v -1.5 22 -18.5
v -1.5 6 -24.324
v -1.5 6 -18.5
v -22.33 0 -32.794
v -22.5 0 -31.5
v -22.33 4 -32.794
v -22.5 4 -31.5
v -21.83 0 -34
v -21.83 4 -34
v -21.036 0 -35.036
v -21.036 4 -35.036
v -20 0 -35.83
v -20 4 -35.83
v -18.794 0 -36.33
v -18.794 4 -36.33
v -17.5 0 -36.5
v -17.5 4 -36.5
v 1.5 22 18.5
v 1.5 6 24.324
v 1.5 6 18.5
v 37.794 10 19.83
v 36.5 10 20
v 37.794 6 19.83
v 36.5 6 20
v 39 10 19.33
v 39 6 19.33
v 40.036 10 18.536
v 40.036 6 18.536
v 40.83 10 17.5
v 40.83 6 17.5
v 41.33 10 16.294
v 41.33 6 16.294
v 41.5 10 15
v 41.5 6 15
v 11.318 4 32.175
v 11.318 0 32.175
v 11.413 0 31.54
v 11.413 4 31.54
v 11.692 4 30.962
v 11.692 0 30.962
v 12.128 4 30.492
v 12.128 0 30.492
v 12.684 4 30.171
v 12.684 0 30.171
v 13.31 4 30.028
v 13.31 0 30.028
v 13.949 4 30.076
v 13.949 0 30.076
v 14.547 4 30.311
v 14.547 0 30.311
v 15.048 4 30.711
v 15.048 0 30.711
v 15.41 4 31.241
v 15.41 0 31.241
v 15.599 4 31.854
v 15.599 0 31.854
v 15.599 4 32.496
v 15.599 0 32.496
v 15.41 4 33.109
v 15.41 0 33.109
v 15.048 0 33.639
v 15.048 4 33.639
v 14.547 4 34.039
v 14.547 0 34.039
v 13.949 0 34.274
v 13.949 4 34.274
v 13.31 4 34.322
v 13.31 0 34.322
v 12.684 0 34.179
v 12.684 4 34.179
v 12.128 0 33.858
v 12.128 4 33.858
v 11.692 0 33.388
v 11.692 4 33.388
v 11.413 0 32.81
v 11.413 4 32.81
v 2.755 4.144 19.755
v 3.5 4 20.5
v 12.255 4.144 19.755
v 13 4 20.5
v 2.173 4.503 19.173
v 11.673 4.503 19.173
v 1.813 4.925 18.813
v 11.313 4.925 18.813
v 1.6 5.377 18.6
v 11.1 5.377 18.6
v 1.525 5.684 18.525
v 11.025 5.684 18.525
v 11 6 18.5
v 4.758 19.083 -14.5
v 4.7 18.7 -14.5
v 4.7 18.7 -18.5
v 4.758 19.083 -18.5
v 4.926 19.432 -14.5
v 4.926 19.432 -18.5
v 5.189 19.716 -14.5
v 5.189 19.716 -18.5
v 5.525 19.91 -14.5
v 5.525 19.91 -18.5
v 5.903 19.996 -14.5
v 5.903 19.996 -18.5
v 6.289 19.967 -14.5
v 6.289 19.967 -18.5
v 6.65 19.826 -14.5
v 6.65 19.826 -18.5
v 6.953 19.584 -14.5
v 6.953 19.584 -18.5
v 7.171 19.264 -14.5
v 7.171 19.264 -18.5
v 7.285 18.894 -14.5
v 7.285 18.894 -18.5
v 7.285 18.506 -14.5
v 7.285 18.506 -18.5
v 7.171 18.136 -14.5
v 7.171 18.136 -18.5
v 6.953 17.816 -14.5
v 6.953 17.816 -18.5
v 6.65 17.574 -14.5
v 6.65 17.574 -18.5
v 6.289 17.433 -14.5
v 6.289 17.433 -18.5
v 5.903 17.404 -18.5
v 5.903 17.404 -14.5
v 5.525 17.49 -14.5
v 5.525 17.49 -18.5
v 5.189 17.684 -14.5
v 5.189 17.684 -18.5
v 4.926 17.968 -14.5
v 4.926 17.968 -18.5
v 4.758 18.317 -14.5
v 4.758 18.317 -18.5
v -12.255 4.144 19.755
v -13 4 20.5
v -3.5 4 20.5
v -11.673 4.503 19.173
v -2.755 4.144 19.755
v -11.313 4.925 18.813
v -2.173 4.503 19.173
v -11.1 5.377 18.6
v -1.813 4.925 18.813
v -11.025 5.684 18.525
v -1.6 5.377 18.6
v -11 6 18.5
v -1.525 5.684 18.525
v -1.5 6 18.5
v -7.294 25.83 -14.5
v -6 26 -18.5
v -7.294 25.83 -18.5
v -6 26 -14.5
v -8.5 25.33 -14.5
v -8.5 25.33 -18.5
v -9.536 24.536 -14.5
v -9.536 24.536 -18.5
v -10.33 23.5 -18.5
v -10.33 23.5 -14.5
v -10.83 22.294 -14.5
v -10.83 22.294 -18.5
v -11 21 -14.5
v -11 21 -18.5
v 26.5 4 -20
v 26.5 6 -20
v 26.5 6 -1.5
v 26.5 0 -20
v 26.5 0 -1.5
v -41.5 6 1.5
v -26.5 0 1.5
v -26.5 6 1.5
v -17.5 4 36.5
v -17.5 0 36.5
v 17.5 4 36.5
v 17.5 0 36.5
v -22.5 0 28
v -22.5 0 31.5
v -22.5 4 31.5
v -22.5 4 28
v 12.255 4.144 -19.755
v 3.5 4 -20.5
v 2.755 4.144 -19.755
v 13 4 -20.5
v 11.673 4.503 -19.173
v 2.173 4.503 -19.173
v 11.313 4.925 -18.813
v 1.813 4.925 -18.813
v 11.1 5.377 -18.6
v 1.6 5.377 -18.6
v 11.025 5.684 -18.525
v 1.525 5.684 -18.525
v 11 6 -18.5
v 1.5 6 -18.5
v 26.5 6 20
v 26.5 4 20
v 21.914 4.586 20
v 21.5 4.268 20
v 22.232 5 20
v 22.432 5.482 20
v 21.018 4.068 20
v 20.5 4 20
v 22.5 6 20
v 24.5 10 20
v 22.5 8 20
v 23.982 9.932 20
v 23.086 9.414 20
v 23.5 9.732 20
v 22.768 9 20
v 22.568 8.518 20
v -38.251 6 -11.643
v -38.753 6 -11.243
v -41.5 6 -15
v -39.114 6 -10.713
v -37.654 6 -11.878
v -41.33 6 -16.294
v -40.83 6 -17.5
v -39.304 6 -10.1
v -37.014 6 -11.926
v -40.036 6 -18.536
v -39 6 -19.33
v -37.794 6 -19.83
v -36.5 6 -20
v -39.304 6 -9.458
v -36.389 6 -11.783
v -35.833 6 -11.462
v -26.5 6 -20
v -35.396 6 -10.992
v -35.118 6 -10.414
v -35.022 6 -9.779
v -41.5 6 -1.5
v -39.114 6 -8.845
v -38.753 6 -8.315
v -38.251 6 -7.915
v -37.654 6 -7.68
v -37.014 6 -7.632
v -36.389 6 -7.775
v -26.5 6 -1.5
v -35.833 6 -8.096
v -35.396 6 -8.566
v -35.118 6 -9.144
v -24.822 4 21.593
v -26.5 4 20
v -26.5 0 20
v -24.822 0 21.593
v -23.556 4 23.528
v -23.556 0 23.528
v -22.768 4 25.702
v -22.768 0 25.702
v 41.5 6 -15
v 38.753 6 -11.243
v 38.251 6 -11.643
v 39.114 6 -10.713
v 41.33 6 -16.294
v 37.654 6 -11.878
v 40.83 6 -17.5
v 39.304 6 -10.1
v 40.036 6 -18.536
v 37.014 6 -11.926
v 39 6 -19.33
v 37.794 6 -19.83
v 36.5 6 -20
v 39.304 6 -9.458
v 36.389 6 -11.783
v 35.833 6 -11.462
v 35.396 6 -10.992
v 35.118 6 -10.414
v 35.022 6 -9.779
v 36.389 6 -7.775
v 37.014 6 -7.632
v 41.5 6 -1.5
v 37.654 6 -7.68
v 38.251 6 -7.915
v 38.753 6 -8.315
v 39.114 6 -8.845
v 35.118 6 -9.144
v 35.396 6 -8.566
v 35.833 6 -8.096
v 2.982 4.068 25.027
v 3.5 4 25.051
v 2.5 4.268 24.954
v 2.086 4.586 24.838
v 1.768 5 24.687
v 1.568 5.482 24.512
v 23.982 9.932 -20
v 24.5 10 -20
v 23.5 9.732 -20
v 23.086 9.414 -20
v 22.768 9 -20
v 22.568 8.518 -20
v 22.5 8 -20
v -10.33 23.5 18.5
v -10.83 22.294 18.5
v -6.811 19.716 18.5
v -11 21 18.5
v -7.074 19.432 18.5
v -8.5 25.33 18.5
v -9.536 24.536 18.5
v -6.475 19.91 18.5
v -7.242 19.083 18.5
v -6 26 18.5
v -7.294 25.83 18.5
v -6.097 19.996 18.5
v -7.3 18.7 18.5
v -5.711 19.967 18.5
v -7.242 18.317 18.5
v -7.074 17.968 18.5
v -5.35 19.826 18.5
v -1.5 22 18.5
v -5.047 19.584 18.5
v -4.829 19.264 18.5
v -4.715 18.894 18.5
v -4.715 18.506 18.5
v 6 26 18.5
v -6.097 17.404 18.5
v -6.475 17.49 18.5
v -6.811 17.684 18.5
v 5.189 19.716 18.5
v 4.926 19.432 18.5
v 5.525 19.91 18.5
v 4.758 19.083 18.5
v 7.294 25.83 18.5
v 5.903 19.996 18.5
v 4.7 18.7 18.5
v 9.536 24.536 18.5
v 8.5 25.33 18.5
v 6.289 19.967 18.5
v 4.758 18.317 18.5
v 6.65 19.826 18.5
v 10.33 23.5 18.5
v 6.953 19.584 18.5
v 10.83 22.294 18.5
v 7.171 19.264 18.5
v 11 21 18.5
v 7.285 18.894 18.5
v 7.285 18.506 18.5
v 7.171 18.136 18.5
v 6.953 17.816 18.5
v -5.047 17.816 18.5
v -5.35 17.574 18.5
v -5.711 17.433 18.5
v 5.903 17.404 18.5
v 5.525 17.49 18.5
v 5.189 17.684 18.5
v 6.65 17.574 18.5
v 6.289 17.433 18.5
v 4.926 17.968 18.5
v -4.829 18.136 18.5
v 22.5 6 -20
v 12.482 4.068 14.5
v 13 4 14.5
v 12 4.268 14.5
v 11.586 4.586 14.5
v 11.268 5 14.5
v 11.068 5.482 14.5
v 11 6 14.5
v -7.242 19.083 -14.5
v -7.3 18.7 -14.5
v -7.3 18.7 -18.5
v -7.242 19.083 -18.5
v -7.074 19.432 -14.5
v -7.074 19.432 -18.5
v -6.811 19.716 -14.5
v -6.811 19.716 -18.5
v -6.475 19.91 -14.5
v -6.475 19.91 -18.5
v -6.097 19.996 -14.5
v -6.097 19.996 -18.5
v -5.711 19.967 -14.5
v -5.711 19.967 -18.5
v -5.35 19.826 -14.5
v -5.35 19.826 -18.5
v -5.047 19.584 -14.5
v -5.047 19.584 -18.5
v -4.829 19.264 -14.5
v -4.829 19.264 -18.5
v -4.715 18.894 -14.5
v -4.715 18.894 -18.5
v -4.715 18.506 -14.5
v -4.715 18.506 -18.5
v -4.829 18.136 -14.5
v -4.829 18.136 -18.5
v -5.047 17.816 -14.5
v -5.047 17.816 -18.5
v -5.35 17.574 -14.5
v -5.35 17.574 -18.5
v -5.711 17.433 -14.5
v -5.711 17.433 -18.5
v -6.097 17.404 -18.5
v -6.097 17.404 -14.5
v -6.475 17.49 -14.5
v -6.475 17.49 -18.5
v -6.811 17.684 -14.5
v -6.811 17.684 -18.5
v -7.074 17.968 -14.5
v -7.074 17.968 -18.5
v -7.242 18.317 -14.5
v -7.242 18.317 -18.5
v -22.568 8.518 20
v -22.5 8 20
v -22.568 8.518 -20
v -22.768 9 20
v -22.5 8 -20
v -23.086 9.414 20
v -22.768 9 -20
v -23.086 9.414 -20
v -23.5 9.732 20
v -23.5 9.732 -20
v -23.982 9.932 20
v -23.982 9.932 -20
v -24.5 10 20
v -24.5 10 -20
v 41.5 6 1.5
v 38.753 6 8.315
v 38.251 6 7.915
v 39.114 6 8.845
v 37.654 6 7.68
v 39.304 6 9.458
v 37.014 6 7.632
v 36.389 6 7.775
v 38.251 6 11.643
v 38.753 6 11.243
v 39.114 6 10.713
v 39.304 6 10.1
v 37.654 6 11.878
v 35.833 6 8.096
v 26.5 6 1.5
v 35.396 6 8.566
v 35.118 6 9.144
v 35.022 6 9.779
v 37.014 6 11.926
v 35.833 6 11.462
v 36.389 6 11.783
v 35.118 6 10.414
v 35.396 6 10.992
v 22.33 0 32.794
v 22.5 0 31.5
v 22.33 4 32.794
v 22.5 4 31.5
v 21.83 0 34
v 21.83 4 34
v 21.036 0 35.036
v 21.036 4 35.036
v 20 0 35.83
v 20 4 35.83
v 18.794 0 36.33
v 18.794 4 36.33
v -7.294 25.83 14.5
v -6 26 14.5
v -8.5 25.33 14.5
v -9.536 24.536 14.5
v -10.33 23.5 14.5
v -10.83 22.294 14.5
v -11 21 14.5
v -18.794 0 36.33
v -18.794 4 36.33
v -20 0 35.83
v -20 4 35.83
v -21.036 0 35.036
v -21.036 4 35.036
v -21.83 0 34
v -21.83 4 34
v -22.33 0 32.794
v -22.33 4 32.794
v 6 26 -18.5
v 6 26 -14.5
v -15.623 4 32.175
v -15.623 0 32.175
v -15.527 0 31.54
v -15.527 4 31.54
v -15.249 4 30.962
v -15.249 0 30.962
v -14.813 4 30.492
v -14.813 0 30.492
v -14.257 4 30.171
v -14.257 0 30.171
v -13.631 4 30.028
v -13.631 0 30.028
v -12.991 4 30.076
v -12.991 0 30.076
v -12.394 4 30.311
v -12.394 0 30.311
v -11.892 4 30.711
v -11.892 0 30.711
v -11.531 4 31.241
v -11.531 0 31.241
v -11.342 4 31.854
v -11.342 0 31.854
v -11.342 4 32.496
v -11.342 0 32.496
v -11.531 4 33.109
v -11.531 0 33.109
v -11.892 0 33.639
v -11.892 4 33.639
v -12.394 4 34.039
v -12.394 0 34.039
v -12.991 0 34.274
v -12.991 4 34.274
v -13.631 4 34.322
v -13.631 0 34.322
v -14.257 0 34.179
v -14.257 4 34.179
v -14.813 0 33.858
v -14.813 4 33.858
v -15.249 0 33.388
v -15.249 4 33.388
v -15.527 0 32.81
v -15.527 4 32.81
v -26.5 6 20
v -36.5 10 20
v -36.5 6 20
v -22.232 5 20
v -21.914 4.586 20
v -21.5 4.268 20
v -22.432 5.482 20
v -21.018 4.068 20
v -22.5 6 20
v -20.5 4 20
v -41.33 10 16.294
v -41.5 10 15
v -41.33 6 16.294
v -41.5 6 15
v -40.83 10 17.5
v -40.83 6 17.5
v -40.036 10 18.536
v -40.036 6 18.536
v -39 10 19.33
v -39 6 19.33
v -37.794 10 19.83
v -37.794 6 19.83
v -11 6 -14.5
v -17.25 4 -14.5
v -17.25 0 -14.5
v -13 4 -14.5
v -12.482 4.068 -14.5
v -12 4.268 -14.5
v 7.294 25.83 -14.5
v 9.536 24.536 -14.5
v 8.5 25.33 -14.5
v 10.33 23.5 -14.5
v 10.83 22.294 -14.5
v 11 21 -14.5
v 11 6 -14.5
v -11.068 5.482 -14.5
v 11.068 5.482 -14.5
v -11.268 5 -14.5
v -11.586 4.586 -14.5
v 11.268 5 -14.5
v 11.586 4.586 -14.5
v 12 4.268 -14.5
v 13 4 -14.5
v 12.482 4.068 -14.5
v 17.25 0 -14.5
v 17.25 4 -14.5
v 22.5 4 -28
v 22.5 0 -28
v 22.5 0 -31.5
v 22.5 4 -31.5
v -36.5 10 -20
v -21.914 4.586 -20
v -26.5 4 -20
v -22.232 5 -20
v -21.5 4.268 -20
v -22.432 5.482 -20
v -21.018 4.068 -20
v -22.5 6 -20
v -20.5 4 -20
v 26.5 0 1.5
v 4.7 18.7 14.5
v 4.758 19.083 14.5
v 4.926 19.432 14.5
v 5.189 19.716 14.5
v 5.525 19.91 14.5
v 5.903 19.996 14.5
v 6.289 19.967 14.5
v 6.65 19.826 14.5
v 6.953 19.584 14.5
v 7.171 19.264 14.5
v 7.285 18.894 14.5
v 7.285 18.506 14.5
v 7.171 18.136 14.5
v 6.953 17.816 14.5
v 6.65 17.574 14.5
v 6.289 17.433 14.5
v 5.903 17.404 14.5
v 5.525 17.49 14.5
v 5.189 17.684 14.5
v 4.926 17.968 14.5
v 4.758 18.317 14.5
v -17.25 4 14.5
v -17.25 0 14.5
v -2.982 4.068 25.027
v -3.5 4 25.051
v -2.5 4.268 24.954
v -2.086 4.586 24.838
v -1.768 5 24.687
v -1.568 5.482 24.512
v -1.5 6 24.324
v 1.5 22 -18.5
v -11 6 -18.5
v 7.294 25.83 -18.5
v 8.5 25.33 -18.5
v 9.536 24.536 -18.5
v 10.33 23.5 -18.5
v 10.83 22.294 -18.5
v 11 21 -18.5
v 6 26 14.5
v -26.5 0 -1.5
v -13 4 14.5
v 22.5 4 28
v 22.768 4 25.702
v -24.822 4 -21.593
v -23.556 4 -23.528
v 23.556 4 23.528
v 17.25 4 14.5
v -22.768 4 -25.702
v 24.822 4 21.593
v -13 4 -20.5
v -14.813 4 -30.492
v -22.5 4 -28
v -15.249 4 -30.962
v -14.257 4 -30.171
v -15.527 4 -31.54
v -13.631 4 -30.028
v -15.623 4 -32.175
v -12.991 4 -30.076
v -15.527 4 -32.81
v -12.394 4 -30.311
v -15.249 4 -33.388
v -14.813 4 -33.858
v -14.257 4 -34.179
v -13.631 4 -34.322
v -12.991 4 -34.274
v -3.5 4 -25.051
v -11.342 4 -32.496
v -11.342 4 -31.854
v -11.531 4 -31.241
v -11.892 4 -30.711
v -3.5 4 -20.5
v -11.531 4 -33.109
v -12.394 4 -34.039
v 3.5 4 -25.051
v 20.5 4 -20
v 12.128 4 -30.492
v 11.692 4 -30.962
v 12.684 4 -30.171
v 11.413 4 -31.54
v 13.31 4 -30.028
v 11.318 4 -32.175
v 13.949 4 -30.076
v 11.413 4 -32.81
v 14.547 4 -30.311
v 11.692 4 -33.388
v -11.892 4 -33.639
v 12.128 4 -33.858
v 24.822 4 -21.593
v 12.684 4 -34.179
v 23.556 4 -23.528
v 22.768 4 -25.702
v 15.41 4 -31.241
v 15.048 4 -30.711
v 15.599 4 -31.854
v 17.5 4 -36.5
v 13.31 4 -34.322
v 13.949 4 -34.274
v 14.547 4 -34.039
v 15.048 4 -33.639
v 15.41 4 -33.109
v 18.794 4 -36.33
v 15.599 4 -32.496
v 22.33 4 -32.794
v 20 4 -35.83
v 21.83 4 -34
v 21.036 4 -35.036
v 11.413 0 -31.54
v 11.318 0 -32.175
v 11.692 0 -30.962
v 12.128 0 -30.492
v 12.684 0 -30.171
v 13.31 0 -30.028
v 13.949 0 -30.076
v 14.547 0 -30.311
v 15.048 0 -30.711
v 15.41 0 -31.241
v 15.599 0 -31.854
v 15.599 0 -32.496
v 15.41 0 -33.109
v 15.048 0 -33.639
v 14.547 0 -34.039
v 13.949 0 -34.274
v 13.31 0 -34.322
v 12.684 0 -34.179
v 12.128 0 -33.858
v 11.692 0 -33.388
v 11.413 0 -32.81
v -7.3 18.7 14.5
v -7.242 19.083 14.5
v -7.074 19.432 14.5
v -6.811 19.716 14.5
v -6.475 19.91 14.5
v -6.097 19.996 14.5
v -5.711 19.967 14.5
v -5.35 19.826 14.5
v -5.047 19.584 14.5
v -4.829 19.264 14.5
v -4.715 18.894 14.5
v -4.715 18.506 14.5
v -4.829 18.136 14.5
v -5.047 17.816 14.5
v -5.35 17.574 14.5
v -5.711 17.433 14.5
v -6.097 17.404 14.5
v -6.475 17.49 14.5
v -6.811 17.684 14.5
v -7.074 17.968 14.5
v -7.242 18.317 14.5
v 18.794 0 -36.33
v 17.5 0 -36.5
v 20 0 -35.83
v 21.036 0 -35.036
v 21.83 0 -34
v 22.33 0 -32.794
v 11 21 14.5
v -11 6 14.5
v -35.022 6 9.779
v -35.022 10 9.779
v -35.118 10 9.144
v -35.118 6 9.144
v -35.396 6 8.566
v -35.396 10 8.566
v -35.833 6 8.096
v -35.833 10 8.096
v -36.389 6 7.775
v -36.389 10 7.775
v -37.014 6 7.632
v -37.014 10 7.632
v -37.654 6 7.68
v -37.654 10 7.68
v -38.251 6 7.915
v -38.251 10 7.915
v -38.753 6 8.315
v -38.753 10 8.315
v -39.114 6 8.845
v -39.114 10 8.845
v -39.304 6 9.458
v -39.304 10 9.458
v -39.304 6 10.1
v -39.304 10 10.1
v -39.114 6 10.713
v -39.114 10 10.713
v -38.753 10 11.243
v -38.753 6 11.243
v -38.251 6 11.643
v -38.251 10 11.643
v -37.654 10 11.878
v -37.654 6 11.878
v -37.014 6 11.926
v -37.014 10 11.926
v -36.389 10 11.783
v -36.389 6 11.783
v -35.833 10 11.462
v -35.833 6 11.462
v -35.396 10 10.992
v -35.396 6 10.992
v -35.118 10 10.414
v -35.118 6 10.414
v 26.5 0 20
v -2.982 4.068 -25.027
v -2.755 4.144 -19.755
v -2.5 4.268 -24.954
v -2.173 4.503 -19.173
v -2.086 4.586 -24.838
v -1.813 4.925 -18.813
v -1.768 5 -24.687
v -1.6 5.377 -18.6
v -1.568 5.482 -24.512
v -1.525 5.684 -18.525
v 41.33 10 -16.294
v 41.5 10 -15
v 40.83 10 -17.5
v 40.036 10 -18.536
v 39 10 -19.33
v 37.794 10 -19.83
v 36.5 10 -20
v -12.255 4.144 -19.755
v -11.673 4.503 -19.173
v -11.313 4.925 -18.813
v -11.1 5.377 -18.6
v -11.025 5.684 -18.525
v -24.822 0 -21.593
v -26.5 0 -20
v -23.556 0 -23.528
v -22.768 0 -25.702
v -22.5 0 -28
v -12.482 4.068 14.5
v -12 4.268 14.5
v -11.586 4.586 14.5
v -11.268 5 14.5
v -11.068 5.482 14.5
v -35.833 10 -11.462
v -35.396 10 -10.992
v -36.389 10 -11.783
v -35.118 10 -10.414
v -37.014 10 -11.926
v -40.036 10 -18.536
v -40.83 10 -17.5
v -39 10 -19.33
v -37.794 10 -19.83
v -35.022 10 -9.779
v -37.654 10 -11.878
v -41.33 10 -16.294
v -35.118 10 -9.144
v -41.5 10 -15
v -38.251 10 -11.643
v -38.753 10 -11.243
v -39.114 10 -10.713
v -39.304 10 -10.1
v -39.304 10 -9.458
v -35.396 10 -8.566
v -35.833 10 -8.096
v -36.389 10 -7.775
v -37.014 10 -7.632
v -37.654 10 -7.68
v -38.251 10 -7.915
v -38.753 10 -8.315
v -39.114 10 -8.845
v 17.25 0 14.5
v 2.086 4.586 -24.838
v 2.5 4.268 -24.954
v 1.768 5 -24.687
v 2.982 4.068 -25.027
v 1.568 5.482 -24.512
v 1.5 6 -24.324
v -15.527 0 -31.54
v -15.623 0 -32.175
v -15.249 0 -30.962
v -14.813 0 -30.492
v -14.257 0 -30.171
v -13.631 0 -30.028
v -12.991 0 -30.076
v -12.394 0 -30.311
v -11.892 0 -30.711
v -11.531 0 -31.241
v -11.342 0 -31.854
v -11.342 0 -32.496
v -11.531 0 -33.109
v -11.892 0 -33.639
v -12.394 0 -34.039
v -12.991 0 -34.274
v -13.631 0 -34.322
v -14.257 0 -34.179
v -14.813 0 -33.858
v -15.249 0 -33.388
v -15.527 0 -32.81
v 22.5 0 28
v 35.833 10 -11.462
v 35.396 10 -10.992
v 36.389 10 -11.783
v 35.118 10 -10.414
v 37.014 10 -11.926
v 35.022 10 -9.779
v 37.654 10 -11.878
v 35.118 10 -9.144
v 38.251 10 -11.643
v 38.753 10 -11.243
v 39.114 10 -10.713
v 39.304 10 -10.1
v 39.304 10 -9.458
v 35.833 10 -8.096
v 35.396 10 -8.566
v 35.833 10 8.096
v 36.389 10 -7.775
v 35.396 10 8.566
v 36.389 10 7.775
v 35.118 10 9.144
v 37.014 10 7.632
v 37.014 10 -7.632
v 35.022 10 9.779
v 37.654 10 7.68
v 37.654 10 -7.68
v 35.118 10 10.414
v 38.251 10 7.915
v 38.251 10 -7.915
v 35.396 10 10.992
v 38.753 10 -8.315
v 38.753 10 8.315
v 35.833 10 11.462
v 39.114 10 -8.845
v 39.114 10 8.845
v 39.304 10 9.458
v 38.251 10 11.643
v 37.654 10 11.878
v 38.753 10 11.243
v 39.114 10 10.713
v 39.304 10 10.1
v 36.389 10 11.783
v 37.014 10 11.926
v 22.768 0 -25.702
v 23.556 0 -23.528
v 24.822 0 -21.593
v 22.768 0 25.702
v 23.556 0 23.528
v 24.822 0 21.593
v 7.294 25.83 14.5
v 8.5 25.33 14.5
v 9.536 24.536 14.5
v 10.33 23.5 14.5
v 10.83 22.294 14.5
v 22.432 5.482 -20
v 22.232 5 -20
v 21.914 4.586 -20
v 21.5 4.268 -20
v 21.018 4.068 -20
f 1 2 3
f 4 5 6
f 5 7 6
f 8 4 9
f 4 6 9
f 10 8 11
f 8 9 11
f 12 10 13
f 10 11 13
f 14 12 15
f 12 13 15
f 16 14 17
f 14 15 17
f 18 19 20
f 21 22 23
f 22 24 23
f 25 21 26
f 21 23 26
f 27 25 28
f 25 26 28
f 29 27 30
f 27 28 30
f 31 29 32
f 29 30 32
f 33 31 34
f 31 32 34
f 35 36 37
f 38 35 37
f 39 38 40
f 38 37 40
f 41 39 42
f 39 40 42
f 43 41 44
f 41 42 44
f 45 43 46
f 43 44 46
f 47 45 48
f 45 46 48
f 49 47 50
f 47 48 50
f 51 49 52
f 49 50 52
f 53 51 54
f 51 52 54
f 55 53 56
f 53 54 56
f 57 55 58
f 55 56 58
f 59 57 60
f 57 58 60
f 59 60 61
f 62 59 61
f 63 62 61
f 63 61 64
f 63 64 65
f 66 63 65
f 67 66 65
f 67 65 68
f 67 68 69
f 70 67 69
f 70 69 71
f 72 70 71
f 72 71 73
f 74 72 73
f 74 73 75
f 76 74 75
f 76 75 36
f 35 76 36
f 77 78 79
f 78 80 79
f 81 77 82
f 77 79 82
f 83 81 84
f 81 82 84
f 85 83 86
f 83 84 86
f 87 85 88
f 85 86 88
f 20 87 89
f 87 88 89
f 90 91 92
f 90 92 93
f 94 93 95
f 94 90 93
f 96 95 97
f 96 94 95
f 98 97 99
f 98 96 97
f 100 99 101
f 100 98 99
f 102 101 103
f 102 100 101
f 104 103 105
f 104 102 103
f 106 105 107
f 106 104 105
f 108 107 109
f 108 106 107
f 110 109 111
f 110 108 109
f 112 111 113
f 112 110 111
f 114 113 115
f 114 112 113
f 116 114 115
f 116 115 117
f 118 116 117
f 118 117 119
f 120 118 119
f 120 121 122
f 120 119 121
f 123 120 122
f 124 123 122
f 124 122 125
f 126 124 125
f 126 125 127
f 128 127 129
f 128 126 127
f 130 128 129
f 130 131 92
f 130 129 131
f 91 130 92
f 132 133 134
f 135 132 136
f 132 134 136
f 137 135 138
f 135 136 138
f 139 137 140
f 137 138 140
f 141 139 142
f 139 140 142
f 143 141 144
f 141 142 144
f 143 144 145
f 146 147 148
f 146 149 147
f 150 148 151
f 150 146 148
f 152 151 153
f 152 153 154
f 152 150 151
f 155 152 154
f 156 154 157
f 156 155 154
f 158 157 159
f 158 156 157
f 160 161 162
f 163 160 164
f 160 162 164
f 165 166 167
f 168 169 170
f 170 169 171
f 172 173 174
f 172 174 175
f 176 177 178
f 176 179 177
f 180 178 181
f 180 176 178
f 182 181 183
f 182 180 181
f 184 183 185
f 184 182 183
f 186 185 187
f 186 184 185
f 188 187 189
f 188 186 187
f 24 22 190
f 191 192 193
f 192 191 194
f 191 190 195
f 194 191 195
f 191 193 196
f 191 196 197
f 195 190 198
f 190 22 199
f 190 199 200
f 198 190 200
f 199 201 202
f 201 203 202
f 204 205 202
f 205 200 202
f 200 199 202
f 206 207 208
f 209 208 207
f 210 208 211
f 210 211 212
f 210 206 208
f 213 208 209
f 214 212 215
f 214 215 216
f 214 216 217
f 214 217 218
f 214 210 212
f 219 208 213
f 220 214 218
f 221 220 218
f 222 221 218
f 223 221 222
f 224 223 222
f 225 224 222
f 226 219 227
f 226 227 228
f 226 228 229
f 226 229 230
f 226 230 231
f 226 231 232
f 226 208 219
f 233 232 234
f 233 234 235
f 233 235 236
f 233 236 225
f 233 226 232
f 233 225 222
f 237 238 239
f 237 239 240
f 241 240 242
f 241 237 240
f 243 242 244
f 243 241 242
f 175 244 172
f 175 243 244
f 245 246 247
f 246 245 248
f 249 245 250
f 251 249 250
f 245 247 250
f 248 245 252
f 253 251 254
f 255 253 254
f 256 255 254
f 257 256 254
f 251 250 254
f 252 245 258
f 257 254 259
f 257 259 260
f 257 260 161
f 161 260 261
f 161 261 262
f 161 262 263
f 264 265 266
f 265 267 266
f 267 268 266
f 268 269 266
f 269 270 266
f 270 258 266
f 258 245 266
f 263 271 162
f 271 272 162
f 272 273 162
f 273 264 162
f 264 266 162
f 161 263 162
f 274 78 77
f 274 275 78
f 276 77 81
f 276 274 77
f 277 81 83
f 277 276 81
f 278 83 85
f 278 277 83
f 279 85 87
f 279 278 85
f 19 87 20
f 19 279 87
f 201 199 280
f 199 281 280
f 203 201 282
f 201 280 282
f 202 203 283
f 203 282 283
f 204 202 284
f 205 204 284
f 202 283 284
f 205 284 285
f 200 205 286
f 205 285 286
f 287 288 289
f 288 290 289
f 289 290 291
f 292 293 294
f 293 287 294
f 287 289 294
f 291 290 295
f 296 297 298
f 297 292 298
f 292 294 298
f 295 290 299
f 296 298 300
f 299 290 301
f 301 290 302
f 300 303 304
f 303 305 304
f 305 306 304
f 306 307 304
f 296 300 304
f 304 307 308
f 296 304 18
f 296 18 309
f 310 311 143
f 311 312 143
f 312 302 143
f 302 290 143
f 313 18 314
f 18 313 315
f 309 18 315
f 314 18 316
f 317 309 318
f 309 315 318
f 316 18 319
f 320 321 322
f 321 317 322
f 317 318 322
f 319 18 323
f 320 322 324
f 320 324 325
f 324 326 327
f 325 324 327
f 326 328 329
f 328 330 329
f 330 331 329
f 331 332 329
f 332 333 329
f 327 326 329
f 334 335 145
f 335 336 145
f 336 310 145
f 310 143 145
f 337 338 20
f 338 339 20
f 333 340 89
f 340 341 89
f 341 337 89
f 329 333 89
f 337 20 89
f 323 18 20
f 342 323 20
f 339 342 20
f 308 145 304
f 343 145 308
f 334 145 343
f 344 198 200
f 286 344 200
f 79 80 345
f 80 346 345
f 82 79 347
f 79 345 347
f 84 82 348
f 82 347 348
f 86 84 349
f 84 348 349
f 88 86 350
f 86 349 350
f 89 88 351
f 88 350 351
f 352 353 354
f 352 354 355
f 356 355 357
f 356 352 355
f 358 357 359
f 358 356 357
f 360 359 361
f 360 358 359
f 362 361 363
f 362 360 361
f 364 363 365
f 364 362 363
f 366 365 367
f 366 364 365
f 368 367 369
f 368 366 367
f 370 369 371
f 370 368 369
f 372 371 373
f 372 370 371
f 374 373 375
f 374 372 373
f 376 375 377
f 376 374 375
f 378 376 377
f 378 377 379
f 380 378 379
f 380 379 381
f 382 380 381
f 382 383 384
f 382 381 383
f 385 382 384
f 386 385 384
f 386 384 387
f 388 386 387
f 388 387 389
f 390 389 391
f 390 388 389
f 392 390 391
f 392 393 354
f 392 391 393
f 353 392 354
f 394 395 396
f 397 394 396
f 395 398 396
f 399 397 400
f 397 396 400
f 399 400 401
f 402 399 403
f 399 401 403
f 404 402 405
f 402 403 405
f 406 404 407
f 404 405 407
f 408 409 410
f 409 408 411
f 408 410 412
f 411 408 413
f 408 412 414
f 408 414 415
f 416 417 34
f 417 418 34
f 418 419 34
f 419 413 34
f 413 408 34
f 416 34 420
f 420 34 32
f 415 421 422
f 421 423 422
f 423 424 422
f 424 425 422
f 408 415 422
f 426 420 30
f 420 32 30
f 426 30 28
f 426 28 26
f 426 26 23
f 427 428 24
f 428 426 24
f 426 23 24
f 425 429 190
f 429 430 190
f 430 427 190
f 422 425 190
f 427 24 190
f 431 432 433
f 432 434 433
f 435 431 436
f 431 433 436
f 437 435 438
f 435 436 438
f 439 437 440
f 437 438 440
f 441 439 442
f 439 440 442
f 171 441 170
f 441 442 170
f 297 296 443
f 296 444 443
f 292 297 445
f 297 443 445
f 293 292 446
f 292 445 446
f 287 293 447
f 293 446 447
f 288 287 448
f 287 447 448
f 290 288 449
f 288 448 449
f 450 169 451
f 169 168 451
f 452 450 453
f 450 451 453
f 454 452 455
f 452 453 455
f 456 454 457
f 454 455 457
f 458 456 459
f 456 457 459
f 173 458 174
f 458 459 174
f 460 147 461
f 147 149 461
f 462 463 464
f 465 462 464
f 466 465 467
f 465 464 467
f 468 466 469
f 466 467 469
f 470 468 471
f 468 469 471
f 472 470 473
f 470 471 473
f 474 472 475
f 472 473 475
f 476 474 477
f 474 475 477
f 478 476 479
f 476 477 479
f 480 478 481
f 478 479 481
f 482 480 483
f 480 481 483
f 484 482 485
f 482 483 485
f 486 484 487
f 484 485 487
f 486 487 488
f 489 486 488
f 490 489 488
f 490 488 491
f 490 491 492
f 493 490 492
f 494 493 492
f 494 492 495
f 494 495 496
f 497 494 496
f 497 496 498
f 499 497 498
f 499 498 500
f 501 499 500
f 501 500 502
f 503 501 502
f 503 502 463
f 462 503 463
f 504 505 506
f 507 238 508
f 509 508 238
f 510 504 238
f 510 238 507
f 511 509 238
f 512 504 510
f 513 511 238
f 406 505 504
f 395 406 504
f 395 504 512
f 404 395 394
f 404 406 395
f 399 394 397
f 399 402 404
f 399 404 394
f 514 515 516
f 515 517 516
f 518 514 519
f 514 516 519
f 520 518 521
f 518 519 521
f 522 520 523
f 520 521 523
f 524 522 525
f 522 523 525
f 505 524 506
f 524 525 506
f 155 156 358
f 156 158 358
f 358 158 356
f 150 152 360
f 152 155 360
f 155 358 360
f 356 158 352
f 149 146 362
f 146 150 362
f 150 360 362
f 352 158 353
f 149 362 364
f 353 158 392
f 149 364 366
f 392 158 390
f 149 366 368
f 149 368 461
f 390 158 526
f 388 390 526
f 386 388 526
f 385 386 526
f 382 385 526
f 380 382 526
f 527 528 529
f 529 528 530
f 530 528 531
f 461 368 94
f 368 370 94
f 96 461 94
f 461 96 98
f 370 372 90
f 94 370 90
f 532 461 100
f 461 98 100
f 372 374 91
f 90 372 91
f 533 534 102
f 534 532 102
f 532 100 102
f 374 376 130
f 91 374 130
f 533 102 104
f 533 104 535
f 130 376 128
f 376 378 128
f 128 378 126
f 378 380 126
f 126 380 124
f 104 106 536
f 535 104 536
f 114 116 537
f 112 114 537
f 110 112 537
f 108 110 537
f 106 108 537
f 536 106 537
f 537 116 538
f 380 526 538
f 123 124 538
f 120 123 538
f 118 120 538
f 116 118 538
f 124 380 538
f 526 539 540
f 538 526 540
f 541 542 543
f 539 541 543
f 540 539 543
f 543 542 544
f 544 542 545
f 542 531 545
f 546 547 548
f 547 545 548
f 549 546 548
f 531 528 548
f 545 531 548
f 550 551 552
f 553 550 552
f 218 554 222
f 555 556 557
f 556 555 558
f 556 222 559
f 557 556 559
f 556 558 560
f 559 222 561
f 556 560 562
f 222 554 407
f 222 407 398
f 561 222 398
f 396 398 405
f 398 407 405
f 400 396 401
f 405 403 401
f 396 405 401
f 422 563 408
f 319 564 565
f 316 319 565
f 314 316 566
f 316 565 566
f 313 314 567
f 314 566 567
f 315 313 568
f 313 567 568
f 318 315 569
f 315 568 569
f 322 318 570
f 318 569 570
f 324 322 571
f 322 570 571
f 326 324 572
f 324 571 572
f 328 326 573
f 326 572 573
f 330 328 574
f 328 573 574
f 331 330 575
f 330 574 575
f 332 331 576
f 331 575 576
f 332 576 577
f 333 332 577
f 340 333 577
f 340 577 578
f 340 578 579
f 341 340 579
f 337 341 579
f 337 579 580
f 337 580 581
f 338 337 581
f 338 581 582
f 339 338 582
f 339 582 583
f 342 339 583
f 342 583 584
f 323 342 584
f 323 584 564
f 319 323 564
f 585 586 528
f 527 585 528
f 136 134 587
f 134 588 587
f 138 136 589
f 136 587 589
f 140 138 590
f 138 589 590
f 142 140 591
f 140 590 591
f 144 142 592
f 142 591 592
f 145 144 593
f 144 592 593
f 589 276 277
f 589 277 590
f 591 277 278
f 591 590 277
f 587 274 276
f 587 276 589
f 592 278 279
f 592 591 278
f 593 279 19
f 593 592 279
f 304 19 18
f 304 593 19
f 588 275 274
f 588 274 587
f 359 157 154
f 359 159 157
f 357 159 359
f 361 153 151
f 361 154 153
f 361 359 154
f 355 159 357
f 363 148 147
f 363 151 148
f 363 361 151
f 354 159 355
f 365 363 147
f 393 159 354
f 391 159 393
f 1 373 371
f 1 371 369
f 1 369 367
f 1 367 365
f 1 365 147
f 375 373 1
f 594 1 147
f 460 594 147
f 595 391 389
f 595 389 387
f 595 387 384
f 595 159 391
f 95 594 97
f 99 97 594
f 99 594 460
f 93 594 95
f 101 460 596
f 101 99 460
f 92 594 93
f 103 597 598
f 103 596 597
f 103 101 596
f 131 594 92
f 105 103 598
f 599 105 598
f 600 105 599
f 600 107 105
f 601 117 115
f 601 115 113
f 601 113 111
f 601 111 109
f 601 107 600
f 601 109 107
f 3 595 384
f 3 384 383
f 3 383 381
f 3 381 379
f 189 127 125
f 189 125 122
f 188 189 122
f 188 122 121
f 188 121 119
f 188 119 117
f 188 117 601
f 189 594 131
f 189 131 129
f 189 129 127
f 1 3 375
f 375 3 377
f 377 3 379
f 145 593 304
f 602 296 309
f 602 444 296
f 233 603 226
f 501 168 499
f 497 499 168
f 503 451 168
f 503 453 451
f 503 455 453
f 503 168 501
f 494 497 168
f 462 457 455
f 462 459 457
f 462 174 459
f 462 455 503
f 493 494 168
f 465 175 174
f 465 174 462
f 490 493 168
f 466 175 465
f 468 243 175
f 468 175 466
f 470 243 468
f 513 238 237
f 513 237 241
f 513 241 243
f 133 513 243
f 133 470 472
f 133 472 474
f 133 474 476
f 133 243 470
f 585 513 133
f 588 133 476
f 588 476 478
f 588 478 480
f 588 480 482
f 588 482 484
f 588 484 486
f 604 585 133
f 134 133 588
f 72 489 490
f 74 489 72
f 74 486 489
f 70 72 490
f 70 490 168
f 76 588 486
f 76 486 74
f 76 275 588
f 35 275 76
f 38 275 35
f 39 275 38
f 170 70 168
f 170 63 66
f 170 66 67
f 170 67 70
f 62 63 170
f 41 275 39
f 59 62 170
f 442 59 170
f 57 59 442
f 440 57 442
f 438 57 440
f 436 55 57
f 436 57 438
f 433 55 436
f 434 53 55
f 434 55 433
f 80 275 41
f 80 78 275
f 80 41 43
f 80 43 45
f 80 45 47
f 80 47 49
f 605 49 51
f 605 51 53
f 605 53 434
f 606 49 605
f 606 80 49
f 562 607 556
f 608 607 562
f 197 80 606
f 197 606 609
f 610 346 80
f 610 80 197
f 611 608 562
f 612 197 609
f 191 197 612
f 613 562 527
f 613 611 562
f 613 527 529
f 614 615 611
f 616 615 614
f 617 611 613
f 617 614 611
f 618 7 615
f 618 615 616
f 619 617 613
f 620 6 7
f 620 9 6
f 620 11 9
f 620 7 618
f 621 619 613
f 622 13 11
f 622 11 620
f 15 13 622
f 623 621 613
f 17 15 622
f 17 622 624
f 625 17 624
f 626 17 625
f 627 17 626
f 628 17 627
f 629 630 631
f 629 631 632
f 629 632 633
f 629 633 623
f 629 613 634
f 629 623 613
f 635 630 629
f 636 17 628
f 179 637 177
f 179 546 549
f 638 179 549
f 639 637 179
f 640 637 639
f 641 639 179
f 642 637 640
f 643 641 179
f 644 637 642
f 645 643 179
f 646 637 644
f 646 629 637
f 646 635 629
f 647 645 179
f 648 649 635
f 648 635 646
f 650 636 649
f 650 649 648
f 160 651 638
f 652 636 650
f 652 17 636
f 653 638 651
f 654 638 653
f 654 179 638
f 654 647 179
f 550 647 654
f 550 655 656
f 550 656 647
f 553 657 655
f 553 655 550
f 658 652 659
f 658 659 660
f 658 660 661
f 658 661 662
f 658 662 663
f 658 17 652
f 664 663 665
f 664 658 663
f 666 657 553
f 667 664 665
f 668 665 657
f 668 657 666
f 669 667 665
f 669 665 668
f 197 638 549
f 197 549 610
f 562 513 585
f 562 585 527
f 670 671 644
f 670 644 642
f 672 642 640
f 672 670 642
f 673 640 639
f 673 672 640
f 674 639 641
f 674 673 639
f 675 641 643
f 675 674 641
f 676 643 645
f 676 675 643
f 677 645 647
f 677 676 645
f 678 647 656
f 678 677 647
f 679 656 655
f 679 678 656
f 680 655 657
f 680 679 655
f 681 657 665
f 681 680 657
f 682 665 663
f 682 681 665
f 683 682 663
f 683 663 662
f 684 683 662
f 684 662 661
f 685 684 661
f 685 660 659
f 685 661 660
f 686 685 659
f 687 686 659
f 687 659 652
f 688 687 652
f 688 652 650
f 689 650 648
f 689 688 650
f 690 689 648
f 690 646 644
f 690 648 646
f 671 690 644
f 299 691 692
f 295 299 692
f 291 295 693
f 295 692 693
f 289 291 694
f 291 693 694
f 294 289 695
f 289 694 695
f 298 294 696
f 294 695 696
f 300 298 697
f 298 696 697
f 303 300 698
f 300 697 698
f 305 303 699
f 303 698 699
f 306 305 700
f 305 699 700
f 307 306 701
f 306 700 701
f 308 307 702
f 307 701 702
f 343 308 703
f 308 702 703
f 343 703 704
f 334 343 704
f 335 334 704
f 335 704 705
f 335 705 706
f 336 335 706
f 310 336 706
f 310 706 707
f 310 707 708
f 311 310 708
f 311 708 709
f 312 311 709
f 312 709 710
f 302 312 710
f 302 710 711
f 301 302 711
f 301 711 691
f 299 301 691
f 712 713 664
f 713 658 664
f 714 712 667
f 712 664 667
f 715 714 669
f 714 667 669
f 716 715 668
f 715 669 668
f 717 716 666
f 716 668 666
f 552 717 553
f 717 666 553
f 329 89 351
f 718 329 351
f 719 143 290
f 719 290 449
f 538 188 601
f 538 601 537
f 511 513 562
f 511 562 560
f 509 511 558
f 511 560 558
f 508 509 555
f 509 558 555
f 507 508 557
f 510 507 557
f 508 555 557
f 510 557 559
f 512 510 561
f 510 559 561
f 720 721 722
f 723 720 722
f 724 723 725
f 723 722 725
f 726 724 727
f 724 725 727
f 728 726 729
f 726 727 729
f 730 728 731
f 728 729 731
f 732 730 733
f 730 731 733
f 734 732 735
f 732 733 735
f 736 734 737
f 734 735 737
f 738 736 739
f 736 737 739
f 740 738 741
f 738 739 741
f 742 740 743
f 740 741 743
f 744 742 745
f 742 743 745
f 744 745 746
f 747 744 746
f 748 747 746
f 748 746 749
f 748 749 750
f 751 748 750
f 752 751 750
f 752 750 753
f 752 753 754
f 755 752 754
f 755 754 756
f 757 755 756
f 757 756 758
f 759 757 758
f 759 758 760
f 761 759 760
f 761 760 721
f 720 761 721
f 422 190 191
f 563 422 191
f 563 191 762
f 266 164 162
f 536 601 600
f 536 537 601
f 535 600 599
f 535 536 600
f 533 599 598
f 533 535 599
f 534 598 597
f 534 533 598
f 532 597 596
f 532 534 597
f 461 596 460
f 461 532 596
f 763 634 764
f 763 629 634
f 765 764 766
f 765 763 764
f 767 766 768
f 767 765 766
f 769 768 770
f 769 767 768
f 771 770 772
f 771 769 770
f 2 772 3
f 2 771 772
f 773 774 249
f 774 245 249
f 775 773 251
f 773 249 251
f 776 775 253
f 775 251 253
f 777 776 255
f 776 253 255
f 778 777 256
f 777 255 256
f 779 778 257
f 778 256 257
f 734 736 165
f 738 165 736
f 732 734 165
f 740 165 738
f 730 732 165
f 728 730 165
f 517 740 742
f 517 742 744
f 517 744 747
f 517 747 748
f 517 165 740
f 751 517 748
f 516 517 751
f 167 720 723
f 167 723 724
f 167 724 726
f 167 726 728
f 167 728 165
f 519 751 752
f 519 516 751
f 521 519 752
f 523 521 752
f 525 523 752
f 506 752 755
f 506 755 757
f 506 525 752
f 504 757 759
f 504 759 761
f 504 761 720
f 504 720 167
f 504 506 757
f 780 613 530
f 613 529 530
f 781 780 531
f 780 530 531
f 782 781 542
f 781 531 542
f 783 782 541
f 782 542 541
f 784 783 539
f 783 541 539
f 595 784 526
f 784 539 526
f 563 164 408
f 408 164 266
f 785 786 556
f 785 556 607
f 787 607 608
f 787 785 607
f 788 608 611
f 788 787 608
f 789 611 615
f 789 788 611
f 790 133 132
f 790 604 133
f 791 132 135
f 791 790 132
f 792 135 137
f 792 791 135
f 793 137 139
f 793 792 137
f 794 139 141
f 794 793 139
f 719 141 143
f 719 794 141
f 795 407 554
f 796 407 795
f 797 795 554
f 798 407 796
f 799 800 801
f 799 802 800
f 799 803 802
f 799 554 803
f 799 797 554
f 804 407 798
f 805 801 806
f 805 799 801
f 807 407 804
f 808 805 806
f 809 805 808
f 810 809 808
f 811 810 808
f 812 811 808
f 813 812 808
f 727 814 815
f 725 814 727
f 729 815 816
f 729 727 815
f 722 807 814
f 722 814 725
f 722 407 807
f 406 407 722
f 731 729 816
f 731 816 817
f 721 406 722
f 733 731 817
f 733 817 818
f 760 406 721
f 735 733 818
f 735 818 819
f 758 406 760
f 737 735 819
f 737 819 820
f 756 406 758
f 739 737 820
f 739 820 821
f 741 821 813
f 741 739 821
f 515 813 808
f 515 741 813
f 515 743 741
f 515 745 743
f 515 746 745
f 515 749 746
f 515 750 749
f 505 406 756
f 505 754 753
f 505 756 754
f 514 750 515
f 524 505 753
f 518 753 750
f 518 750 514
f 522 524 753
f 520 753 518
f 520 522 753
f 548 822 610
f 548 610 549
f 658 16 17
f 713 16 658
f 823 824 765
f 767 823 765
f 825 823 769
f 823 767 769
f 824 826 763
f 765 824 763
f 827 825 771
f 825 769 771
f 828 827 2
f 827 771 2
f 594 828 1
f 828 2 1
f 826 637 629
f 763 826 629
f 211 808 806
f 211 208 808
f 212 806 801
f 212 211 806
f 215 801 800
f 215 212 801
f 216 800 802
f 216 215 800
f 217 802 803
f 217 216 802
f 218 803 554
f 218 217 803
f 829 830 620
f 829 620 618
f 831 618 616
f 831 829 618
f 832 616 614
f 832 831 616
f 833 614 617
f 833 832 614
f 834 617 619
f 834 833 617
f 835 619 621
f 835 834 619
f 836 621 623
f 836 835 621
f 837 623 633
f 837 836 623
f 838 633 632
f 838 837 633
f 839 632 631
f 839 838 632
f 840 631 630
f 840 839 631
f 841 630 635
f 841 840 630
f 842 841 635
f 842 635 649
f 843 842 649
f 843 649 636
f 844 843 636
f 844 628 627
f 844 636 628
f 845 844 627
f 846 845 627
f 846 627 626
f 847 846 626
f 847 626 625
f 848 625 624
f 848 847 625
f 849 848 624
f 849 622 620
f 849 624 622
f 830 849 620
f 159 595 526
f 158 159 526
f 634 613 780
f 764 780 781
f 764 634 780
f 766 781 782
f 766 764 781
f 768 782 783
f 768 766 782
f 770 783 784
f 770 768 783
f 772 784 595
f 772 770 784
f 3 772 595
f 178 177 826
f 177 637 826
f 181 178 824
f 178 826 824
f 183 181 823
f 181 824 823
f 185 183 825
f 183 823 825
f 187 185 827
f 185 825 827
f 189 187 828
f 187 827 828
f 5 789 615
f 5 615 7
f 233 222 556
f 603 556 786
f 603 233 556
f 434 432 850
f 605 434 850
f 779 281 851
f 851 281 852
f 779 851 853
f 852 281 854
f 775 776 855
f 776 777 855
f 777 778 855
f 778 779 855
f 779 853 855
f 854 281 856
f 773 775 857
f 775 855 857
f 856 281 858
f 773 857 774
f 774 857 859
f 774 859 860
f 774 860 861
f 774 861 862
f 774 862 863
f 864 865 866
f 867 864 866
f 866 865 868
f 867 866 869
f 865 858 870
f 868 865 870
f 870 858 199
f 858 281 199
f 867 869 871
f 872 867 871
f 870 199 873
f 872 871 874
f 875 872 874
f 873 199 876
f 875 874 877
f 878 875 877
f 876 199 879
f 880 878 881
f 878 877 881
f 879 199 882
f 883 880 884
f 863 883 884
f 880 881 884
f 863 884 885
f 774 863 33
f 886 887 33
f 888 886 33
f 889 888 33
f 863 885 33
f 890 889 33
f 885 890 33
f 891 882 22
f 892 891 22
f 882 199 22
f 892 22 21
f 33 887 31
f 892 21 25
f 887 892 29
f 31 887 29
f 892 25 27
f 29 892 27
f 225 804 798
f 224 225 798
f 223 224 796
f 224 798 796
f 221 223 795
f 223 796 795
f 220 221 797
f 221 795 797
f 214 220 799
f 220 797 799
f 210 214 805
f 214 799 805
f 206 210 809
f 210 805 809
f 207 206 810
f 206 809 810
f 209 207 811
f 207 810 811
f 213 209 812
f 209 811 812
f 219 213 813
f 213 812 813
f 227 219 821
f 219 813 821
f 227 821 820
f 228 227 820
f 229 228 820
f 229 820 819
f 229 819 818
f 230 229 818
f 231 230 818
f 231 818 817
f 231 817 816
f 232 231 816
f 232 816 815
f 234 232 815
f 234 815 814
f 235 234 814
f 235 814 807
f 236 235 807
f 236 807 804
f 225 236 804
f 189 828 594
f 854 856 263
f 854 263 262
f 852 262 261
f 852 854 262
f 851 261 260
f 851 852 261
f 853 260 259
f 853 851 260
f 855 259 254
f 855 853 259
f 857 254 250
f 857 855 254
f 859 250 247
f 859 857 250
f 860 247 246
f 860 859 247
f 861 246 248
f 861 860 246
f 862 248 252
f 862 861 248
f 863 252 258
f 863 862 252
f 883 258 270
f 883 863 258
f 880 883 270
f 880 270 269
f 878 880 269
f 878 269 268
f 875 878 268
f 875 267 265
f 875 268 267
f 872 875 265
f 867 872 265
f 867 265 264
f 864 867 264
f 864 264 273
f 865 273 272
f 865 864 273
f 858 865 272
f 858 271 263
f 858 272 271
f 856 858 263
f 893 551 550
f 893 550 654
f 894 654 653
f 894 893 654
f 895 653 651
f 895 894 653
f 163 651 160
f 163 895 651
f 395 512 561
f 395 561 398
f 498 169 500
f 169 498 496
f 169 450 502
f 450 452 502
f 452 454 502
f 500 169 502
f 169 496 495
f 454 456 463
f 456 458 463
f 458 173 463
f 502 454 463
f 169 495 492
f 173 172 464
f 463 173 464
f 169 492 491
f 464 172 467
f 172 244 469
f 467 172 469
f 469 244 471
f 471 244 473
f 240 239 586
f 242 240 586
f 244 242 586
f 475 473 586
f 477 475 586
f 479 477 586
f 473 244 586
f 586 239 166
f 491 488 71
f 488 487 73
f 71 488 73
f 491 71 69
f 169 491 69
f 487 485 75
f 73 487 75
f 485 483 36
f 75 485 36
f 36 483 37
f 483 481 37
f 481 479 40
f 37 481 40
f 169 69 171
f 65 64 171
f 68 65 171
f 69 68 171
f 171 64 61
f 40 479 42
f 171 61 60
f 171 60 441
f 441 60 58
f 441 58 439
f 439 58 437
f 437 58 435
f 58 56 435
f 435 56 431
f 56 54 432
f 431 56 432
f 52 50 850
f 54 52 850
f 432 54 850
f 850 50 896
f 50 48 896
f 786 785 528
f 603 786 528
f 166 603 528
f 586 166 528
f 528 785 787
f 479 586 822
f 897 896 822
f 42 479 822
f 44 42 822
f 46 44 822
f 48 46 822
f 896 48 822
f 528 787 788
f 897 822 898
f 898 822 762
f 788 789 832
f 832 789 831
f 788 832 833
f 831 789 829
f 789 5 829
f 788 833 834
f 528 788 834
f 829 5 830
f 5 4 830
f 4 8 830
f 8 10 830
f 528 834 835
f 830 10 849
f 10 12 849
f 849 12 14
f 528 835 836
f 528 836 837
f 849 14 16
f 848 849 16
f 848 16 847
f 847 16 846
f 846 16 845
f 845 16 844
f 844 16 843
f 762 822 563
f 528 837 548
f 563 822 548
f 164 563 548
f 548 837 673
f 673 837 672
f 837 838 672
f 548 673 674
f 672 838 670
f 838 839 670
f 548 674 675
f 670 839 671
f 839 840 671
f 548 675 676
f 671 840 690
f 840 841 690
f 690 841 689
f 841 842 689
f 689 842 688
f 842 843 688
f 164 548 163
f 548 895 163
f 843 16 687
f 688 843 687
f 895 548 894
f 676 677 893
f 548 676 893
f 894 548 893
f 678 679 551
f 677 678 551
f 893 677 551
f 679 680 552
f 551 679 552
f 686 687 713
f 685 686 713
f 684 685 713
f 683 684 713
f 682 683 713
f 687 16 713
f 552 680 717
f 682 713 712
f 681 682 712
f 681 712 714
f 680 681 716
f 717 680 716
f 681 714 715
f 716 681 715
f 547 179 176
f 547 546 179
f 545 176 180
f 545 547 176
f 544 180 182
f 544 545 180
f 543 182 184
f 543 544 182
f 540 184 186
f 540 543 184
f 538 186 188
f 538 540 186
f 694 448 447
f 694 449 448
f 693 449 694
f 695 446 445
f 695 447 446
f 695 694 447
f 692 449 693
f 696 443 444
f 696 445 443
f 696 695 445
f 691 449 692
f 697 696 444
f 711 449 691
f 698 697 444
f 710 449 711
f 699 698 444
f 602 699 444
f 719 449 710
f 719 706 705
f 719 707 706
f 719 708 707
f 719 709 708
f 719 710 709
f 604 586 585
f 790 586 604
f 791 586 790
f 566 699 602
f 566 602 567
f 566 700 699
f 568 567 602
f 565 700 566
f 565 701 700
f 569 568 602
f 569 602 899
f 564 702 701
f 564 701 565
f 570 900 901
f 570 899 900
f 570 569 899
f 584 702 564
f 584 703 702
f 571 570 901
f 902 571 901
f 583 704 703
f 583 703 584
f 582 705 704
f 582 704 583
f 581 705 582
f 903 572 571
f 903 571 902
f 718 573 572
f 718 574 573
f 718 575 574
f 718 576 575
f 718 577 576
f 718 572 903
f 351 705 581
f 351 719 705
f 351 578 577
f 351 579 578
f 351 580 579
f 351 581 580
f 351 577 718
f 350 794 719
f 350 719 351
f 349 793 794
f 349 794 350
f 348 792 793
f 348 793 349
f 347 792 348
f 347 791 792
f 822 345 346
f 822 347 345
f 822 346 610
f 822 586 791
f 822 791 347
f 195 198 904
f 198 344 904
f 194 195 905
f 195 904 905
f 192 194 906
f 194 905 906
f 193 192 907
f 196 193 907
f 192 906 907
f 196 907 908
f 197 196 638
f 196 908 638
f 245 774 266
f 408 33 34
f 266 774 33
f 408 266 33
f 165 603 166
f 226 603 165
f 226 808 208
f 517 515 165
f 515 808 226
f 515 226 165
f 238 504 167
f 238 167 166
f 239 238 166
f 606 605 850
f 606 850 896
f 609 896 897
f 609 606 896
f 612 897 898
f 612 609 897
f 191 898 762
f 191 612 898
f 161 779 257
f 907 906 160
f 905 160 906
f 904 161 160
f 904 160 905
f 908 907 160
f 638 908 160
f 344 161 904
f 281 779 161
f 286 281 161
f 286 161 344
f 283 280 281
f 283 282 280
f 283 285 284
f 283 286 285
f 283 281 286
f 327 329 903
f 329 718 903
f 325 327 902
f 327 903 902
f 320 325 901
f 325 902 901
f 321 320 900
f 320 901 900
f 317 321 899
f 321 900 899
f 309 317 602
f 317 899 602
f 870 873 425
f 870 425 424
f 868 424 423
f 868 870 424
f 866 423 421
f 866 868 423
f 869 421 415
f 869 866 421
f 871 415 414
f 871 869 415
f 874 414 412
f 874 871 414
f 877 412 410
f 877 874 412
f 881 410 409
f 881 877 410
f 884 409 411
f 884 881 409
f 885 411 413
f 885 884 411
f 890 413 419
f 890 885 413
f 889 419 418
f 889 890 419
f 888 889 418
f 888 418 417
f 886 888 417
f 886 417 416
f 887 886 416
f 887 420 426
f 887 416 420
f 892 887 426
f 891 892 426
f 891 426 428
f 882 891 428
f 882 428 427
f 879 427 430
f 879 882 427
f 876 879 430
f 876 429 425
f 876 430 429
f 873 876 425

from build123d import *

# Parameters (mm, degrees)
SKETCH1_W             = 45
SKETCH1_H             = 73
SKETCH1_W_2           = 34.5
SKETCH1_H_2           = 29
BOSS_EXTRUDE1_DEPTH   = 4
BOSS_EXTRUDE2_DEPTH   = 20
SKETCH6_W             = 22
SKETCH6_H             = 4
BOSS_EXTRUDE3_DEPTH   = 22
F_6_CLEARANCE_HOLE1_D = 4.3053
F_6_CLEARANCE_HOLE2_D = 4.3053
M2_CLEARANCE_HOLE1_D  = 2.6
RIB3_REACH            = 63.078
SKETCH12_WALL_W       = 140.31113285
SKETCH12_WALL_H       = 3
RIB4_REACH            = 63.078
SKETCH13_WALL_W       = 143.310838334
SKETCH13_WALL_H       = 3
FILLET2_R             = 2
FILLET3_R             = 5
FILLET4_R             = 10


with BuildPart() as part:
    # Sketch1 → Boss-Extrude1 (new body)
    with BuildSketch(Plane(origin=(0, 0, 0), x_dir=(1, 0, 0), z_dir=(0, 1, 0))):
        Rectangle(SKETCH1_W, SKETCH1_H)
        Rectangle(SKETCH1_W_2, SKETCH1_H_2, mode=Mode.SUBTRACT)
    extrude(amount=BOSS_EXTRUDE1_DEPTH)

    # Sketch2 → Boss-Extrude2 (add, symmetric)
    with BuildSketch(Plane.XY):
        Polygon((-22.5, 4), (-22.5, 10), (-41.5, 10), (-41.5, 6), (-26.5, 6), (-26.5, 0), (-22.5, 0), align=None)
    boss_extrude2 = extrude(amount=BOSS_EXTRUDE2_DEPTH, both=True)

    # Sketch6 → Boss-Extrude3 (add)
    with BuildSketch(Plane(origin=(0, 4, 0), x_dir=(1, 0, 0), z_dir=(0, 1, 0))):
        with Locations((0, -16.5)):
            Rectangle(SKETCH6_W, SKETCH6_H)
    boss_extrude3 = extrude(amount=BOSS_EXTRUDE3_DEPTH)

    # #6 Clearance Hole1 (through all)
    with Locations(Plane(origin=(0, 6, 0), x_dir=(-1, 0, 0), z_dir=(0, -1, 0))):
        with Locations((37.175, -9.779), (37.175, 9.779)):
            f_6_clearance_hole1 = Hole(F_6_CLEARANCE_HOLE1_D / 2)

    # #6 Clearance Hole2 (through all)
    with Locations(Plane(origin=(0, 4, 0), x_dir=(1, 0, 0), z_dir=(0, 1, 0))):
        with Locations((-13.470384182, -32.175), (13.470384182, -32.175)):
            f_6_clearance_hole2 = Hole(F_6_CLEARANCE_HOLE2_D / 2)

    # M2 Clearance Hole1 (through all)
    with Locations(Plane.XY.offset(18.5)):
        with Locations((6, 18.7), (-6, 18.7)):
            m2_clearance_hole1 = Hole(M2_CLEARANCE_HOLE1_D / 2)

    # Sketch12 wall → Rib3 (add, up to next)
    with BuildSketch(Plane(origin=(-34, 3, 0), x_dir=(-0.928476690885, 0.371390676354, 0), z_dir=(-0.371390676354, -0.928476690885, 0)), mode=Mode.PRIVATE) as rib3_sk1:
        Rectangle(SKETCH12_WALL_W, SKETCH12_WALL_H)
    rib3_tool1 = extrude(rib3_sk1.sketch, amount=-RIB3_REACH, mode=Mode.PRIVATE) - part.part
    rib3 = rib3_tool1.solids().sort_by_distance((-34, 3, 0))[0]
    add(rib3)

    # Sketch13 wall → Rib4 (add, up to next)
    with BuildSketch(Plane(origin=(0, 13, 21.775732109), x_dir=(0, 0.939692620782, -0.342020143335), z_dir=(0, 0.342020143335, 0.939692620782)), mode=Mode.PRIVATE) as rib4_sk1:
        Rectangle(SKETCH13_WALL_W, SKETCH13_WALL_H)
    rib4_tool1 = extrude(rib4_sk1.sketch, amount=-RIB4_REACH, mode=Mode.PRIVATE) - part.part
    rib4 = rib4_tool1.solids().sort_by_distance((0, 13, 21.775732109))[0]
    add(rib4)

    # Mirror1: Boss-Extrude3, #6 Clearance Hole2, M2 Clearance Hole1, Rib4 across plane
    add(boss_extrude3.mirror(Plane.XY))
    add(f_6_clearance_hole2.mirror(Plane.XY), mode=Mode.SUBTRACT)
    add(m2_clearance_hole1.mirror(Plane.XY), mode=Mode.SUBTRACT)
    add(rib4.mirror(Plane.XY))

    # Mirror4: Boss-Extrude2, #6 Clearance Hole1, Rib3 across plane
    add(boss_extrude2.mirror(Plane(origin=(0, 0, 0), x_dir=(0, 0, 1), z_dir=(1, 0, 0))))
    add(f_6_clearance_hole1.mirror(Plane(origin=(0, 0, 0), x_dir=(0, 0, 1), z_dir=(1, 0, 0))), mode=Mode.SUBTRACT)
    add(rib3.mirror(Plane(origin=(0, 0, 0), x_dir=(0, 0, 1), z_dir=(1, 0, 0))))

    # Fillet2
    fillet2_edges = [part.edges().sort_by_distance(p)[0] for p in [
        (6.25, 4, 18.5),
        (1.5, 4, 21.775732109),
        (-1.5, 4, 21.775732109),
        (-11, 4, -16.5),
        (-6.25, 4, -18.5),
        (11, 4, -16.5),
        (6.25, 4, -18.5),
        (1.5, 4, -21.775732109),
        (-1.5, 4, -21.775732109),
        (22.5, 4, 0),
        (22.5, 10, 0),
        (-22.5, 4, 0),
        (-22.5, 10, 0),
        (-11, 4, 16.5),
        (-6.25, 4, 18.5),
        (11, 4, 16.5),
    ]]
    fillet(fillet2_edges, radius=FILLET2_R)

    # Fillet3
    fillet3_edges = [part.edges().sort_by_distance(p)[0] for p in [
        (-11, 26, -16.5),
        (11, 26, -16.5),
        (41.5, 8, 20),
        (41.5, 8, -20),
        (-41.5, 8, -20),
        (-41.5, 8, 20),
        (-11, 26, 16.5),
        (11, 26, 16.5),
        (-22.5, 2, -36.5),
        (22.5, 2, -36.5),
        (22.5, 2, 36.5),
        (-22.5, 2, 36.5),
    ]]
    fillet(fillet3_edges, radius=FILLET3_R)

    # Fillet4
    # the kernel refuses this fillet: 10 mm, written as the material it adds along each edge
    with BuildSketch(Plane(origin=(22.5, 4, 20), x_dir=(1, 0, 0), z_dir=(0, -1, 0))) as fillet4_piece_1:
        with BuildLine():
            CenterArc((10, 8), FILLET4_R, 180, 53.130102354)
            Line((0, 8), (0, 0))
            Line((0, 0), (4, 0))
        make_face()
    extrude(amount=4)
    with BuildSketch(Plane(origin=(22.5, 0, -20), x_dir=(0, 0, -1), z_dir=(0, 1, 0))) as fillet4_piece_2:
        with BuildLine():
            CenterArc((8, -10), FILLET4_R, 90, 53.130102354)
            Line((0, -4), (0, 0))
            Line((0, 0), (8, 0))
        make_face()
    extrude(amount=4)
    with BuildSketch(Plane(origin=(-22.5, 0, -20), x_dir=(0, 0, -1), z_dir=(0, 1, 0))) as fillet4_piece_3:
        with BuildLine():
            CenterArc((8, 10), FILLET4_R, 216.869897646, 53.130102354)
            Line((0, 4), (0, 0))
            Line((0, 0), (8, 0))
        make_face()
    extrude(amount=4)
    with BuildSketch(Plane(origin=(-22.5, 4, 20), x_dir=(-1, 0, 0), z_dir=(0, -1, 0))) as fillet4_piece_4:
        with BuildLine():
            CenterArc((10, -8), FILLET4_R, 126.869897646, 53.130102354)
            Line((0, -8), (0, 0))
            Line((0, 0), (4, 0))
        make_face()
    extrude(amount=4)


solid = part.part
